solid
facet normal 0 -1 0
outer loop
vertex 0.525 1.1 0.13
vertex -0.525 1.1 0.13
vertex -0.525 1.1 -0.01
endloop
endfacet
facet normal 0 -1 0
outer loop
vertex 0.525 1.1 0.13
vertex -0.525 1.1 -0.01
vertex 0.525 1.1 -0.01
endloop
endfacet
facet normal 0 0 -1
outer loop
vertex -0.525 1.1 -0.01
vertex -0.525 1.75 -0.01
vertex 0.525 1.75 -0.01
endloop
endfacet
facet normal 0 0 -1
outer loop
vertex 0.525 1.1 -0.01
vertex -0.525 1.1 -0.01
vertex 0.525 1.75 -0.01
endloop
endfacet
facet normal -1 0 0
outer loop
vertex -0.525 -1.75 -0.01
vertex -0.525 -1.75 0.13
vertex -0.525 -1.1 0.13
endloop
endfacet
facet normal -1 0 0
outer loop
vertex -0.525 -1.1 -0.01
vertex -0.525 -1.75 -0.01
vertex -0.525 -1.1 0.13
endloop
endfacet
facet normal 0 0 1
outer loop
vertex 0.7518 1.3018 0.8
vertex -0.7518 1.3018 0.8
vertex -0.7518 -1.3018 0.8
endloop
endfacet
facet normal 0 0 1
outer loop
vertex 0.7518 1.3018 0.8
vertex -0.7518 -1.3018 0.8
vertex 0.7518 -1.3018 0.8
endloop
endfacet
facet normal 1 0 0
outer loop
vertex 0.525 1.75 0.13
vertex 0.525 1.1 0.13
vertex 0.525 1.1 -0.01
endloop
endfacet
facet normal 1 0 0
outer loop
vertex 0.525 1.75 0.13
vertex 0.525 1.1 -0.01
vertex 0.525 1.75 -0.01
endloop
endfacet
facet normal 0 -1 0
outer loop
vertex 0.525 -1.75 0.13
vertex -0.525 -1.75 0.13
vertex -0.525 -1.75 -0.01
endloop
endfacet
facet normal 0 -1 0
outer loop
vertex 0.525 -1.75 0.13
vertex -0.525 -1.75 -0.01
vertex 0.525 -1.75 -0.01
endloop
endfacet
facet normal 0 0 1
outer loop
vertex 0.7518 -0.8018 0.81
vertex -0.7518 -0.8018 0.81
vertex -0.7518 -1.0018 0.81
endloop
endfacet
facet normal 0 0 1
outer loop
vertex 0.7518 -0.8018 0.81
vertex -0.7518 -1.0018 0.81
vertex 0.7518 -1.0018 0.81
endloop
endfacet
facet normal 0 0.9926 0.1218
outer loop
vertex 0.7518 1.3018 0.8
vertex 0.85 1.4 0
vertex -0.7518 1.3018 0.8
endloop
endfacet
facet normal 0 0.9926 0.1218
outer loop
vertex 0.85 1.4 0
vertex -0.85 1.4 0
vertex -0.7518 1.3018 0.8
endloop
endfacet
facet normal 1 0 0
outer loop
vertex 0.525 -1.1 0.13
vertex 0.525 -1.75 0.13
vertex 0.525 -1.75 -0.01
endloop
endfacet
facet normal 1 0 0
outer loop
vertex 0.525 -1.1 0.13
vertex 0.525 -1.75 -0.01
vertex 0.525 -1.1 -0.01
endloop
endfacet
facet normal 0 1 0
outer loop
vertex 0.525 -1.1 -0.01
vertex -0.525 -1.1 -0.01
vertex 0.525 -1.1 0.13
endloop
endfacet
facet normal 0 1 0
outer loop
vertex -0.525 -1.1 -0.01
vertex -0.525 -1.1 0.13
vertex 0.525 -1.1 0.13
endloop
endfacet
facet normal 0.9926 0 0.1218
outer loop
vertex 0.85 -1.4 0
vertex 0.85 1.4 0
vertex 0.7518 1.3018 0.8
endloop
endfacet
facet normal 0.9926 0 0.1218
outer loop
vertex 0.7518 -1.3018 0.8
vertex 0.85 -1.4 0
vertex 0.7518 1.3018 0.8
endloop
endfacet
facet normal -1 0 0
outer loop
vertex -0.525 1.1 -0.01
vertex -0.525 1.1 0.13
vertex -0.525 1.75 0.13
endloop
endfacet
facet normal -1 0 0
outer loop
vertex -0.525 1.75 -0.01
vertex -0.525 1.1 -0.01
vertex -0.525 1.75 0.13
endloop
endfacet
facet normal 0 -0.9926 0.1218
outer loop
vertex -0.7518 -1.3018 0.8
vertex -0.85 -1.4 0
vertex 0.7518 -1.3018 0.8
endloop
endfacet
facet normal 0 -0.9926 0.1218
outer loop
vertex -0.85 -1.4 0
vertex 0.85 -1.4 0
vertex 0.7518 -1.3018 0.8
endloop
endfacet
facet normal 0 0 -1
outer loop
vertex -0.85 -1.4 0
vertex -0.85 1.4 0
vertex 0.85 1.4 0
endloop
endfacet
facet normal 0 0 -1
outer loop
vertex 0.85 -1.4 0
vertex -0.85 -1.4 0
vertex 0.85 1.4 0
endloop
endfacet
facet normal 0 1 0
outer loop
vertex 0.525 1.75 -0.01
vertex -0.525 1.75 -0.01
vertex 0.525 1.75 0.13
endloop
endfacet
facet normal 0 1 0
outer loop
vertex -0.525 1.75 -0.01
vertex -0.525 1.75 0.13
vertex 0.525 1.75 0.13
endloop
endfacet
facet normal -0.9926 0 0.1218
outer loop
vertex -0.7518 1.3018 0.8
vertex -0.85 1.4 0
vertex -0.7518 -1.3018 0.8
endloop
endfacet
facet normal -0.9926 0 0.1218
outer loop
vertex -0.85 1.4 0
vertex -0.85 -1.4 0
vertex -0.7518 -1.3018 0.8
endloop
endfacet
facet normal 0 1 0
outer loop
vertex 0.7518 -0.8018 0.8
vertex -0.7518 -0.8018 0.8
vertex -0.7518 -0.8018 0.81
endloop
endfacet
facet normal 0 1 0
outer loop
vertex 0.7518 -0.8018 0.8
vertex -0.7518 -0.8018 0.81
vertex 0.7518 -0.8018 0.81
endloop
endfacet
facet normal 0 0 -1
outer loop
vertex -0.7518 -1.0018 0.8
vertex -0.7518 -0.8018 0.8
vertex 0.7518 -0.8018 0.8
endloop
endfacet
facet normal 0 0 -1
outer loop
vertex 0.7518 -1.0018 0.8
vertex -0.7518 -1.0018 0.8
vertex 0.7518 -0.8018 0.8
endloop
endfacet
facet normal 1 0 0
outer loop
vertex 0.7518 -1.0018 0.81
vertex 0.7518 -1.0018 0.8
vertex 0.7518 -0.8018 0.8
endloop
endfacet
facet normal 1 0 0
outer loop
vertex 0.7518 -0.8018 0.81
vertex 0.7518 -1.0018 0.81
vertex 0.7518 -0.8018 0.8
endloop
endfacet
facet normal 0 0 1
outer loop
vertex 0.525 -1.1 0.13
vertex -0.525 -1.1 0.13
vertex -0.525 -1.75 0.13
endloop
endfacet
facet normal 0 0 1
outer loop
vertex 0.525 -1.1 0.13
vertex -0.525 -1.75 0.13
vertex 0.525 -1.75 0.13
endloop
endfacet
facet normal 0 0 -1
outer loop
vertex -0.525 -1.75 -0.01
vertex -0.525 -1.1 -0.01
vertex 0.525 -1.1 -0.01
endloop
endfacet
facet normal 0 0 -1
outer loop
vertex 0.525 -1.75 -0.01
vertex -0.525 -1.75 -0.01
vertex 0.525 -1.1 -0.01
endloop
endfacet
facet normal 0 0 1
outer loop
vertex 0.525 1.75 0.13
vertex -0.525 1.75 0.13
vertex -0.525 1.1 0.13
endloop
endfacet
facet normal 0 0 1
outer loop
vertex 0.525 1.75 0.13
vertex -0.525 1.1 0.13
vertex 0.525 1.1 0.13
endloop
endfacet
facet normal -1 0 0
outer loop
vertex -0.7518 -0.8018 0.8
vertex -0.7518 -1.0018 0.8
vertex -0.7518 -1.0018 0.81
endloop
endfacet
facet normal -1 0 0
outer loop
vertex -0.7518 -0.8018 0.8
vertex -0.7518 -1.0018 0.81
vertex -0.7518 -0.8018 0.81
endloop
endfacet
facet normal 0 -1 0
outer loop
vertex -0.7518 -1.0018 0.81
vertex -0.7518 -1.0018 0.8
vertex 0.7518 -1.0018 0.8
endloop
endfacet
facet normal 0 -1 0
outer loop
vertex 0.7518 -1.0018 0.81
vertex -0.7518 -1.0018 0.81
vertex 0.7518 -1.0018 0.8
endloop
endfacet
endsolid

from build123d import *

# Parameters (mm, degrees)
F0_W          = 1.7
F0_H          = 2.8
F1_DEPTH      = 0.8
F1_TAPER      = 7
F2_W          = 1.05
F2_H          = 0.65
F3_DEPTH      = 0.13
F3_DEPTH_BACK = 0.01
F4_W          = 1.5035447026
F4_H          = 0.2
F5_DEPTH      = 0.01


with BuildPart() as f1:
    # F0 (on Top) → F1 (new body)
    with BuildSketch(Plane.XY):
        Rectangle(F0_W, F0_H)
    extrude(amount=F1_DEPTH, taper=F1_TAPER)


with BuildPart() as f3:
    # F2 (on Top) → F3 (new body, two sides)
    with BuildSketch(Plane.XY) as f3_sk:
        with Locations((0, 1.425)):
            Rectangle(F2_W, F2_H)
    extrude(amount=F3_DEPTH)
    extrude(f3_sk.sketch, amount=-F3_DEPTH_BACK)


with BuildPart() as f3b:
    # F2 (on Top) → F3, piece 2 (new body, two sides)
    with BuildSketch(Plane.XY) as f3_2_sk:
        with Locations((0, -1.425)):
            Rectangle(F2_W, F2_H)
    extrude(amount=F3_DEPTH)
    extrude(f3_2_sk.sketch, amount=-F3_DEPTH_BACK)


with BuildPart() as f5:
    # F4 (on face) → F5 (new body)
    with BuildSketch(Plane.XY.offset(0.8)):
        with Locations((0, -0.9017723513)):
            Rectangle(F4_W, F4_H)
    extrude(amount=F5_DEPTH)


solid = Compound([f1.part, f3.part, f3b.part, f5.part])
